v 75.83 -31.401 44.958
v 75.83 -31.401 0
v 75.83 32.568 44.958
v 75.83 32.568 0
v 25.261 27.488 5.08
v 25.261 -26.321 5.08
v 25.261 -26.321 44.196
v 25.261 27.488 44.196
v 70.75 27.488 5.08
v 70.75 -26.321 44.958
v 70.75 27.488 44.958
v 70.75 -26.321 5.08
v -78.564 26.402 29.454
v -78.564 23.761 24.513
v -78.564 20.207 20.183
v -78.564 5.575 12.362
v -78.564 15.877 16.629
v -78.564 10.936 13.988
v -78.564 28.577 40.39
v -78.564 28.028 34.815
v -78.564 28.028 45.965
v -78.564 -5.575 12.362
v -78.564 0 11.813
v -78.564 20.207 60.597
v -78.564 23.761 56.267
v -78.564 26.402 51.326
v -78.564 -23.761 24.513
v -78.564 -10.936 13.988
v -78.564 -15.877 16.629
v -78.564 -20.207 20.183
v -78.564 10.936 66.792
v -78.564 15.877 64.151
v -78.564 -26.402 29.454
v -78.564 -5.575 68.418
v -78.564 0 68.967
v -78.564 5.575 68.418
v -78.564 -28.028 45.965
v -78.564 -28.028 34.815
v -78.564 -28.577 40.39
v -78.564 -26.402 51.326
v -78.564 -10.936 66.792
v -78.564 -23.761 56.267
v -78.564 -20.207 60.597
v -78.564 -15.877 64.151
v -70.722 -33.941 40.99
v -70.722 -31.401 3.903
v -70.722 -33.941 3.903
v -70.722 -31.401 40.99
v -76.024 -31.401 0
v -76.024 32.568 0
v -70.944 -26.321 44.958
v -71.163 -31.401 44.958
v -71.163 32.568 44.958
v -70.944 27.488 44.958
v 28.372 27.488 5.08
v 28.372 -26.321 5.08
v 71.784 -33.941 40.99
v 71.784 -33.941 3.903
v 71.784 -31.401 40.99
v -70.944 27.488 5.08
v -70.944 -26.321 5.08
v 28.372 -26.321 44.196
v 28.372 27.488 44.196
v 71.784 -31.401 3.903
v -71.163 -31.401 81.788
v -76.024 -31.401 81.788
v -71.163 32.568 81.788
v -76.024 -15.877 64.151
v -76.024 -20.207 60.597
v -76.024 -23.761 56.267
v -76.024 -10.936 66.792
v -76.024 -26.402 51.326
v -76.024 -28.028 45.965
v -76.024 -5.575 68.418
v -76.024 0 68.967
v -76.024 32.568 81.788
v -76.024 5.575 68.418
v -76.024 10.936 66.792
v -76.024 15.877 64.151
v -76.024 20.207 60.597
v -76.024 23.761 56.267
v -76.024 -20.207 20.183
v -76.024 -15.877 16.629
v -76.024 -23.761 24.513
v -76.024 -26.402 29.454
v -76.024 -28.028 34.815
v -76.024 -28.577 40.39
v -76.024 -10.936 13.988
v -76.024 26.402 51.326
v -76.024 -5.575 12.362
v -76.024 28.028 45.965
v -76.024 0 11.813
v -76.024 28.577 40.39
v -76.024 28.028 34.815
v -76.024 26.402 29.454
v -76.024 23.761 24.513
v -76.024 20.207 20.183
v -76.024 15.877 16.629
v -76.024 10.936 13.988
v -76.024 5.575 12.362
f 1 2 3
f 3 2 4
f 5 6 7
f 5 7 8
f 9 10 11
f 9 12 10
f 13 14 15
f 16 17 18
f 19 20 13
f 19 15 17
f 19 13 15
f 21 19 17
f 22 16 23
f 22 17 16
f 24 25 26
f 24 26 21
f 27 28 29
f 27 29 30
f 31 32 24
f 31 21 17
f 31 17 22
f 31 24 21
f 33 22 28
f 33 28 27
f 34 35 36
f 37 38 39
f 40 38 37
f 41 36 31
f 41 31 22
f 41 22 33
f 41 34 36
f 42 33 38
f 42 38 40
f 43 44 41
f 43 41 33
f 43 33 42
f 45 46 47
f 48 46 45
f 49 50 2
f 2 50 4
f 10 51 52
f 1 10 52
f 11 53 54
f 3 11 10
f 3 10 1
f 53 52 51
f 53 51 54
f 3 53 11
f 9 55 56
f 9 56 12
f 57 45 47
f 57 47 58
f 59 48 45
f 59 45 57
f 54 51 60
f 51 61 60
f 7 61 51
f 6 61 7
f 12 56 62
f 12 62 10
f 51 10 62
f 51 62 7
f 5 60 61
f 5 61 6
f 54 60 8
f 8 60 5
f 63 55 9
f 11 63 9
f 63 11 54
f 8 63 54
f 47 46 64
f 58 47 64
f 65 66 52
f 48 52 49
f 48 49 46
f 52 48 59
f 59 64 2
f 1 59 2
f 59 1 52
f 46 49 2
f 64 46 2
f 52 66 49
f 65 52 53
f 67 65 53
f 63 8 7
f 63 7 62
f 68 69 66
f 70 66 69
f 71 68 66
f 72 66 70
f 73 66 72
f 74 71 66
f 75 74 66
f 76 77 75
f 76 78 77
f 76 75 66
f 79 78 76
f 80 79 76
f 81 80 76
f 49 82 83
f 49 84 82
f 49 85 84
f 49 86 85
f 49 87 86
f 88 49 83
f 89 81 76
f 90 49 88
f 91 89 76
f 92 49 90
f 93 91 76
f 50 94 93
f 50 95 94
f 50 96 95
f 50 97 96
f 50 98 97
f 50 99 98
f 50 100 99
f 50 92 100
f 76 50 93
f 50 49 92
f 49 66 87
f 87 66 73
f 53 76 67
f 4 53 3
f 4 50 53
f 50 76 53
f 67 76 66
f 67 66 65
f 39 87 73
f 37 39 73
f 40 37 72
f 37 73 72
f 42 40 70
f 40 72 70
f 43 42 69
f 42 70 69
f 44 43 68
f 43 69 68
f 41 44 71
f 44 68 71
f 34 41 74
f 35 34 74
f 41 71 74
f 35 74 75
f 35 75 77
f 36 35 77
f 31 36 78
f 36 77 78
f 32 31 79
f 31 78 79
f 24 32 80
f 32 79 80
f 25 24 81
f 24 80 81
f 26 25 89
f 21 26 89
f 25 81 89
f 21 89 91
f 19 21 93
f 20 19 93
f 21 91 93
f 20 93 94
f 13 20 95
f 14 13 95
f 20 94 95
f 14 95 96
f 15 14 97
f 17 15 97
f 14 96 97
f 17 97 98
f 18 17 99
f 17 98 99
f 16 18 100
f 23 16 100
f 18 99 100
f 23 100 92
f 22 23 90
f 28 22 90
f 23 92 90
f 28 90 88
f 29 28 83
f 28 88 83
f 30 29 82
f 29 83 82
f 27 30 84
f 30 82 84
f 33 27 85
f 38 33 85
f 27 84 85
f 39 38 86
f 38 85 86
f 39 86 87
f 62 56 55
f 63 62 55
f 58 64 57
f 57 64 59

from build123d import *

# Parameters (mm, degrees)
F0_W      = 151.853732
F0_H      = 63.969113
F1_DEPTH  = 44.958
F2_T      = -5.08
F3_W      = 4.860878
F3_H      = 63.969113
F4_DEPTH  = 36.83
F5_R      = 28.577313
F6_DEPTH  = 2.54
F7_W      = 142.505951
F7_H      = 37.087826
F8_DEPTH  = 2.54
F9_W      = 3.11096
F9_H      = 53.809113
F10_DEPTH = 39.116


with BuildPart() as f1:
    # F0 (on Top) → F1 (new body)
    with BuildSketch(Plane.XY):
        with Locations((-0.097219, 0.583305)):
            Rectangle(F0_W, F0_H)
    extrude(amount=F1_DEPTH)

    # F2
    f2_openings = [f1.faces().sort_by_distance(p)[0] for p in [
        (-0.097219, 0.583306, 44.958),
    ]]
    offset(amount=F2_T, openings=f2_openings)

    # F3 (on face) → F4 (join)
    with BuildSketch(Plane.XY.offset(44.958)):
        with Locations((-73.593646, 0.583305)):
            Rectangle(F3_W, F3_H)
    extrude(amount=F4_DEPTH)

    # F5 (on face) → F6 (join)
    with BuildSketch(Plane(origin=(-76.024085, 0, 0), x_dir=(0, -1, 0), z_dir=(-1, 0, 0))):
        with Locations((0, 40.390089)):
            Circle(F5_R)
    extrude(amount=F6_DEPTH)

    # F7 (on face) → F8 (join)
    with BuildSketch(Plane.XZ.offset(31.401251)):
        with Locations((0.531253, 22.446518)):
            Rectangle(F7_W, F7_H)
    extrude(amount=F8_DEPTH)

    # F9 (on face) → F10 (join)
    with BuildSketch(Plane.XY.offset(5.08)):
        with Locations((26.816599, 0.583305)):
            Rectangle(F9_W, F9_H)
    extrude(amount=F10_DEPTH)


solid = f1.part
